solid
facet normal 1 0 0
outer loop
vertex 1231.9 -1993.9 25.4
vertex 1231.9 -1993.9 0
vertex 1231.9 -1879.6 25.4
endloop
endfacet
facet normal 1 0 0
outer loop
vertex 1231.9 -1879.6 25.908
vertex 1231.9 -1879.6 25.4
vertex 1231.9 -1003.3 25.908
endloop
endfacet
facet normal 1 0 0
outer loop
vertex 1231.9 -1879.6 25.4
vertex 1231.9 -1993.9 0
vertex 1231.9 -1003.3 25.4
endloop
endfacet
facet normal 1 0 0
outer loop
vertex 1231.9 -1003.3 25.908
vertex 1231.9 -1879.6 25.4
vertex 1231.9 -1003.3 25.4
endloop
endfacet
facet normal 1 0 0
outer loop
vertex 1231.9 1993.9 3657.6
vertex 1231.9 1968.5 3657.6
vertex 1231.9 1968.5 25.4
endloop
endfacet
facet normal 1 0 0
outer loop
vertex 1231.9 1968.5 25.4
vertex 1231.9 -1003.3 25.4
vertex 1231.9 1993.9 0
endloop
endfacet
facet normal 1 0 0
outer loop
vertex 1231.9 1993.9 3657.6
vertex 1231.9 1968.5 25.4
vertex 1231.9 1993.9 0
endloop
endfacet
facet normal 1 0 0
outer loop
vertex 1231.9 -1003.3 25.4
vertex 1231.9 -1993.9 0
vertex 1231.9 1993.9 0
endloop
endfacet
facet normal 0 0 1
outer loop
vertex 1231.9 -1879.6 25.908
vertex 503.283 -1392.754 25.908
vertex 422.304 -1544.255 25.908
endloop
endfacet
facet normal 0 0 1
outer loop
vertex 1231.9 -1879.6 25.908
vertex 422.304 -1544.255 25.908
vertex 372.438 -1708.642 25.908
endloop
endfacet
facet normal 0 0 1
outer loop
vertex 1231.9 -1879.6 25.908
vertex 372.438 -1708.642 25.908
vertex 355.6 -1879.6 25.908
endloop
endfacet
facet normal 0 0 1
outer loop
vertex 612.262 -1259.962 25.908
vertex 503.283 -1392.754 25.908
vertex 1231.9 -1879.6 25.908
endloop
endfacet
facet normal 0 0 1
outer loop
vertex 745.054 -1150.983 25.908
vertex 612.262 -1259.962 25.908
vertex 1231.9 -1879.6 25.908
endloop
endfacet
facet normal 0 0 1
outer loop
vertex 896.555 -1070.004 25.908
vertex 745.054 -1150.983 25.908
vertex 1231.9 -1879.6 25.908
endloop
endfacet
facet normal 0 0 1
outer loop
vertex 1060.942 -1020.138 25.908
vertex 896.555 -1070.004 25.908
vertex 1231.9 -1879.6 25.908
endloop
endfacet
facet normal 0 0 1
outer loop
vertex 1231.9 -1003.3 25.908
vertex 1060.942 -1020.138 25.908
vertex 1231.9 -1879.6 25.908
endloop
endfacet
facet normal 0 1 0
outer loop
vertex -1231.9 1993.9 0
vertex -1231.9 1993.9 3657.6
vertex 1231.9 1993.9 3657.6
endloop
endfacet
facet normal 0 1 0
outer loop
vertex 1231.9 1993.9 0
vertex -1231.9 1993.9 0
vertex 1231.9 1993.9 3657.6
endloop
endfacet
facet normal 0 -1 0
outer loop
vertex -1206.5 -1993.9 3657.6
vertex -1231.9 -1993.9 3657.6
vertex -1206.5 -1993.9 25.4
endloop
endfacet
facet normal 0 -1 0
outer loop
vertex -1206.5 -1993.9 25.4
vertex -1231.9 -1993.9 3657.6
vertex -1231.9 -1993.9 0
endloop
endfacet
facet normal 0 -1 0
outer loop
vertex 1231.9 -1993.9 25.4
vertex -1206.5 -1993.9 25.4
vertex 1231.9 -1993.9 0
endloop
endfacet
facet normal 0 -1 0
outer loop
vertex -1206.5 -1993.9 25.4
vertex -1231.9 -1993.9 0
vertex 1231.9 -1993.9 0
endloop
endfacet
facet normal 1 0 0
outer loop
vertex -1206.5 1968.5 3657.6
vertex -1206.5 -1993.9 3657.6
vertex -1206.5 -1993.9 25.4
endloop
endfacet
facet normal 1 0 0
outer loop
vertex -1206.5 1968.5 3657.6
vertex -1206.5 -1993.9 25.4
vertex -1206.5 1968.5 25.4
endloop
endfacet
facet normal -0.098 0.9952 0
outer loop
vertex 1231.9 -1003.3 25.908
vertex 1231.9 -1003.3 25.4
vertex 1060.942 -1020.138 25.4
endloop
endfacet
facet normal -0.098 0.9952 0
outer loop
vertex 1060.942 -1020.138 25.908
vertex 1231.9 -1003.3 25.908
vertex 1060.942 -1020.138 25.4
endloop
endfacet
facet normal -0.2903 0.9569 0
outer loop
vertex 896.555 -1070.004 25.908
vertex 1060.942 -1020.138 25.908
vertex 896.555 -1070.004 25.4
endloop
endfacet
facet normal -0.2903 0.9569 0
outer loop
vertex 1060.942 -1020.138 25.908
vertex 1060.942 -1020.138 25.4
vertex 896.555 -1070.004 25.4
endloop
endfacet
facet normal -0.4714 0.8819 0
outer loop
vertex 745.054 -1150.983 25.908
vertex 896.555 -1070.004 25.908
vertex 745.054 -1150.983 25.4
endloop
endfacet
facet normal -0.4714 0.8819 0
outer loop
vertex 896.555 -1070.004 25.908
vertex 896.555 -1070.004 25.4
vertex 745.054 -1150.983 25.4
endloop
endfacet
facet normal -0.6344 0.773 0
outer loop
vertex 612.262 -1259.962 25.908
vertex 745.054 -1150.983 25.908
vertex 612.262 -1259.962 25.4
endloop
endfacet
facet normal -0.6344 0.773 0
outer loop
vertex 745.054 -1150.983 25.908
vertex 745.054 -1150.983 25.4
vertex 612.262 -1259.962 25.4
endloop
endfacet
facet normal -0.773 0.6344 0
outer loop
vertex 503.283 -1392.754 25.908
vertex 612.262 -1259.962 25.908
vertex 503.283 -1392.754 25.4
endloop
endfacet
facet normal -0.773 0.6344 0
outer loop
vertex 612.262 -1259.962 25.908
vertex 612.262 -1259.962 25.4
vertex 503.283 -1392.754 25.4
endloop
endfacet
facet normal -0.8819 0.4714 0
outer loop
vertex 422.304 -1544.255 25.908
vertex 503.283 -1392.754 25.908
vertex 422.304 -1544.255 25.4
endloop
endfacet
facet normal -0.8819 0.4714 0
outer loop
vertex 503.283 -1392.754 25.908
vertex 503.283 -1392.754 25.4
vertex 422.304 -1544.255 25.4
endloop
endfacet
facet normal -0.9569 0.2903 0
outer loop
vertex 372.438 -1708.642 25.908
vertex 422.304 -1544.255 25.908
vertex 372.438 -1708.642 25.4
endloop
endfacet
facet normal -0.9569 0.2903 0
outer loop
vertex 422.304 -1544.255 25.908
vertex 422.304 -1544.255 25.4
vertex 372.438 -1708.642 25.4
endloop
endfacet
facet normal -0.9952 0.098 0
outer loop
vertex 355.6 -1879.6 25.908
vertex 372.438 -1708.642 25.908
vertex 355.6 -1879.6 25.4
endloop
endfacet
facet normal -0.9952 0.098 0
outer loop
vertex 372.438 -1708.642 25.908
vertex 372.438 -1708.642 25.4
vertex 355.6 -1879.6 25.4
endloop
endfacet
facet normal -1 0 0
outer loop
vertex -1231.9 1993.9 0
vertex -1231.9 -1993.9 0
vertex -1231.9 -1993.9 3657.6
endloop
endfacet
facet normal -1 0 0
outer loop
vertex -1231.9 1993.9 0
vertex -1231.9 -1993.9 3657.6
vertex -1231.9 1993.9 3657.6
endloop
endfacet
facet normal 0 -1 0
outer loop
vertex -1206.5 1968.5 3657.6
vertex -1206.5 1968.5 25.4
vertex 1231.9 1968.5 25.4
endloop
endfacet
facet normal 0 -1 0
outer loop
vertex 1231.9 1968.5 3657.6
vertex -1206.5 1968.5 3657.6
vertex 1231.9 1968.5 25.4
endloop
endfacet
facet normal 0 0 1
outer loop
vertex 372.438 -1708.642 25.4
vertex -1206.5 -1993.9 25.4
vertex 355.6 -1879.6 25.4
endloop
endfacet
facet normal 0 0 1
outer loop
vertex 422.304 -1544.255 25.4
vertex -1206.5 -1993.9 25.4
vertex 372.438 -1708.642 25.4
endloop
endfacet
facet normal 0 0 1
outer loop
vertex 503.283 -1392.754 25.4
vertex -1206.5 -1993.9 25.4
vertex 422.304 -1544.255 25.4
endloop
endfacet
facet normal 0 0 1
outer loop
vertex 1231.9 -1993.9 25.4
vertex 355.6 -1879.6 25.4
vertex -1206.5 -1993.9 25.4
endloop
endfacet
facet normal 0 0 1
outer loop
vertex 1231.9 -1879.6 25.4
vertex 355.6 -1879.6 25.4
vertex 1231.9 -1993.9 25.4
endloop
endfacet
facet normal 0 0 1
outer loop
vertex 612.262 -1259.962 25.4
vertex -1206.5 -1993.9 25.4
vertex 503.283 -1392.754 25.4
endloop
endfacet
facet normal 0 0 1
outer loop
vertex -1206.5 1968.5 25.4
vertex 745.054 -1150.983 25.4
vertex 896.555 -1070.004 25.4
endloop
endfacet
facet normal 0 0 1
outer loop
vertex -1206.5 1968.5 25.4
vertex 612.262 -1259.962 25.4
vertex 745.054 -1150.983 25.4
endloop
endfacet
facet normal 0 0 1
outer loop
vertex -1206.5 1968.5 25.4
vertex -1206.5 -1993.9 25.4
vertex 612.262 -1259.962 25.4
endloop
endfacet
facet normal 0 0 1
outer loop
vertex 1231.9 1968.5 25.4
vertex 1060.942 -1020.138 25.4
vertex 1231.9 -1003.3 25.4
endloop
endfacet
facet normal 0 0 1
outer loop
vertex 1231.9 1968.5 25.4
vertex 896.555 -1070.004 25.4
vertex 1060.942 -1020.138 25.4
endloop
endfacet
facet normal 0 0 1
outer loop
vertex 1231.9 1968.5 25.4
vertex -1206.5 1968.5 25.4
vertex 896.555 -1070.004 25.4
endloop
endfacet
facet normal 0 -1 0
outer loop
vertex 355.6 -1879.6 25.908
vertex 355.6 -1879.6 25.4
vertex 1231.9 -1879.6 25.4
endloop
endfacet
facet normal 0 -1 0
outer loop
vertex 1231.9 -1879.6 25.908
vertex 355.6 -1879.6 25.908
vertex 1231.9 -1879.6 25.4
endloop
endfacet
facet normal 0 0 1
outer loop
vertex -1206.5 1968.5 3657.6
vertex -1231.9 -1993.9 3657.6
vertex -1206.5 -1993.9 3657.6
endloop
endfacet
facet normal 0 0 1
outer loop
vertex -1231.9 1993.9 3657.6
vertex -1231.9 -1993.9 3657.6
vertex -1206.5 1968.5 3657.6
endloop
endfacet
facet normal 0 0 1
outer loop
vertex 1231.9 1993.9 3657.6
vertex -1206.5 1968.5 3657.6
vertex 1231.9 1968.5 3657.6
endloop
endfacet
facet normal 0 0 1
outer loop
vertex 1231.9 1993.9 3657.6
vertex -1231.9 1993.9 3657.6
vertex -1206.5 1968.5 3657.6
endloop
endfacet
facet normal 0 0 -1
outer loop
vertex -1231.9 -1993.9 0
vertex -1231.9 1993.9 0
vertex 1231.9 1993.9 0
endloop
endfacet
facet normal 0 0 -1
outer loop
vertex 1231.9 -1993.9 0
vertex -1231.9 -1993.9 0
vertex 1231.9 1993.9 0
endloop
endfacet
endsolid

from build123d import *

# Parameters (mm, degrees)
F0_W     = 2463.8
F0_H     = 3987.8
F1_DEPTH = 3657.6
F2_W     = 3442.794827
F2_H     = 5006.721598
F3_DEPTH = 3632.2
F5_DEPTH = 0.508


with BuildPart() as f1:
    # F0 (on Top) → F1 (new body)
    with BuildSketch(Plane.XY):
        Rectangle(F0_W, F0_H)
    extrude(amount=F1_DEPTH)

    # F2 (on face) → F3 (cut)
    with BuildSketch(Plane.XY.offset(3657.6)):
        with Locations((514.897413, -534.860799)):
            Rectangle(F2_W, F2_H)
    extrude(amount=-F3_DEPTH, mode=Mode.SUBTRACT)

    # F4 (on face) → F5 (join)
    with BuildSketch(Plane.XY.offset(25.4)):
        with BuildLine():
            ThreePointArc((1231.9, -1003.3), (612.262328, -1259.962328), (355.6, -1879.6))
            Line((355.6, -1879.6), (1231.9, -1879.6))
            Line((1231.9, -1879.6), (1231.9, -1003.3))
        make_face()
    extrude(amount=F5_DEPTH)


solid = f1.part
